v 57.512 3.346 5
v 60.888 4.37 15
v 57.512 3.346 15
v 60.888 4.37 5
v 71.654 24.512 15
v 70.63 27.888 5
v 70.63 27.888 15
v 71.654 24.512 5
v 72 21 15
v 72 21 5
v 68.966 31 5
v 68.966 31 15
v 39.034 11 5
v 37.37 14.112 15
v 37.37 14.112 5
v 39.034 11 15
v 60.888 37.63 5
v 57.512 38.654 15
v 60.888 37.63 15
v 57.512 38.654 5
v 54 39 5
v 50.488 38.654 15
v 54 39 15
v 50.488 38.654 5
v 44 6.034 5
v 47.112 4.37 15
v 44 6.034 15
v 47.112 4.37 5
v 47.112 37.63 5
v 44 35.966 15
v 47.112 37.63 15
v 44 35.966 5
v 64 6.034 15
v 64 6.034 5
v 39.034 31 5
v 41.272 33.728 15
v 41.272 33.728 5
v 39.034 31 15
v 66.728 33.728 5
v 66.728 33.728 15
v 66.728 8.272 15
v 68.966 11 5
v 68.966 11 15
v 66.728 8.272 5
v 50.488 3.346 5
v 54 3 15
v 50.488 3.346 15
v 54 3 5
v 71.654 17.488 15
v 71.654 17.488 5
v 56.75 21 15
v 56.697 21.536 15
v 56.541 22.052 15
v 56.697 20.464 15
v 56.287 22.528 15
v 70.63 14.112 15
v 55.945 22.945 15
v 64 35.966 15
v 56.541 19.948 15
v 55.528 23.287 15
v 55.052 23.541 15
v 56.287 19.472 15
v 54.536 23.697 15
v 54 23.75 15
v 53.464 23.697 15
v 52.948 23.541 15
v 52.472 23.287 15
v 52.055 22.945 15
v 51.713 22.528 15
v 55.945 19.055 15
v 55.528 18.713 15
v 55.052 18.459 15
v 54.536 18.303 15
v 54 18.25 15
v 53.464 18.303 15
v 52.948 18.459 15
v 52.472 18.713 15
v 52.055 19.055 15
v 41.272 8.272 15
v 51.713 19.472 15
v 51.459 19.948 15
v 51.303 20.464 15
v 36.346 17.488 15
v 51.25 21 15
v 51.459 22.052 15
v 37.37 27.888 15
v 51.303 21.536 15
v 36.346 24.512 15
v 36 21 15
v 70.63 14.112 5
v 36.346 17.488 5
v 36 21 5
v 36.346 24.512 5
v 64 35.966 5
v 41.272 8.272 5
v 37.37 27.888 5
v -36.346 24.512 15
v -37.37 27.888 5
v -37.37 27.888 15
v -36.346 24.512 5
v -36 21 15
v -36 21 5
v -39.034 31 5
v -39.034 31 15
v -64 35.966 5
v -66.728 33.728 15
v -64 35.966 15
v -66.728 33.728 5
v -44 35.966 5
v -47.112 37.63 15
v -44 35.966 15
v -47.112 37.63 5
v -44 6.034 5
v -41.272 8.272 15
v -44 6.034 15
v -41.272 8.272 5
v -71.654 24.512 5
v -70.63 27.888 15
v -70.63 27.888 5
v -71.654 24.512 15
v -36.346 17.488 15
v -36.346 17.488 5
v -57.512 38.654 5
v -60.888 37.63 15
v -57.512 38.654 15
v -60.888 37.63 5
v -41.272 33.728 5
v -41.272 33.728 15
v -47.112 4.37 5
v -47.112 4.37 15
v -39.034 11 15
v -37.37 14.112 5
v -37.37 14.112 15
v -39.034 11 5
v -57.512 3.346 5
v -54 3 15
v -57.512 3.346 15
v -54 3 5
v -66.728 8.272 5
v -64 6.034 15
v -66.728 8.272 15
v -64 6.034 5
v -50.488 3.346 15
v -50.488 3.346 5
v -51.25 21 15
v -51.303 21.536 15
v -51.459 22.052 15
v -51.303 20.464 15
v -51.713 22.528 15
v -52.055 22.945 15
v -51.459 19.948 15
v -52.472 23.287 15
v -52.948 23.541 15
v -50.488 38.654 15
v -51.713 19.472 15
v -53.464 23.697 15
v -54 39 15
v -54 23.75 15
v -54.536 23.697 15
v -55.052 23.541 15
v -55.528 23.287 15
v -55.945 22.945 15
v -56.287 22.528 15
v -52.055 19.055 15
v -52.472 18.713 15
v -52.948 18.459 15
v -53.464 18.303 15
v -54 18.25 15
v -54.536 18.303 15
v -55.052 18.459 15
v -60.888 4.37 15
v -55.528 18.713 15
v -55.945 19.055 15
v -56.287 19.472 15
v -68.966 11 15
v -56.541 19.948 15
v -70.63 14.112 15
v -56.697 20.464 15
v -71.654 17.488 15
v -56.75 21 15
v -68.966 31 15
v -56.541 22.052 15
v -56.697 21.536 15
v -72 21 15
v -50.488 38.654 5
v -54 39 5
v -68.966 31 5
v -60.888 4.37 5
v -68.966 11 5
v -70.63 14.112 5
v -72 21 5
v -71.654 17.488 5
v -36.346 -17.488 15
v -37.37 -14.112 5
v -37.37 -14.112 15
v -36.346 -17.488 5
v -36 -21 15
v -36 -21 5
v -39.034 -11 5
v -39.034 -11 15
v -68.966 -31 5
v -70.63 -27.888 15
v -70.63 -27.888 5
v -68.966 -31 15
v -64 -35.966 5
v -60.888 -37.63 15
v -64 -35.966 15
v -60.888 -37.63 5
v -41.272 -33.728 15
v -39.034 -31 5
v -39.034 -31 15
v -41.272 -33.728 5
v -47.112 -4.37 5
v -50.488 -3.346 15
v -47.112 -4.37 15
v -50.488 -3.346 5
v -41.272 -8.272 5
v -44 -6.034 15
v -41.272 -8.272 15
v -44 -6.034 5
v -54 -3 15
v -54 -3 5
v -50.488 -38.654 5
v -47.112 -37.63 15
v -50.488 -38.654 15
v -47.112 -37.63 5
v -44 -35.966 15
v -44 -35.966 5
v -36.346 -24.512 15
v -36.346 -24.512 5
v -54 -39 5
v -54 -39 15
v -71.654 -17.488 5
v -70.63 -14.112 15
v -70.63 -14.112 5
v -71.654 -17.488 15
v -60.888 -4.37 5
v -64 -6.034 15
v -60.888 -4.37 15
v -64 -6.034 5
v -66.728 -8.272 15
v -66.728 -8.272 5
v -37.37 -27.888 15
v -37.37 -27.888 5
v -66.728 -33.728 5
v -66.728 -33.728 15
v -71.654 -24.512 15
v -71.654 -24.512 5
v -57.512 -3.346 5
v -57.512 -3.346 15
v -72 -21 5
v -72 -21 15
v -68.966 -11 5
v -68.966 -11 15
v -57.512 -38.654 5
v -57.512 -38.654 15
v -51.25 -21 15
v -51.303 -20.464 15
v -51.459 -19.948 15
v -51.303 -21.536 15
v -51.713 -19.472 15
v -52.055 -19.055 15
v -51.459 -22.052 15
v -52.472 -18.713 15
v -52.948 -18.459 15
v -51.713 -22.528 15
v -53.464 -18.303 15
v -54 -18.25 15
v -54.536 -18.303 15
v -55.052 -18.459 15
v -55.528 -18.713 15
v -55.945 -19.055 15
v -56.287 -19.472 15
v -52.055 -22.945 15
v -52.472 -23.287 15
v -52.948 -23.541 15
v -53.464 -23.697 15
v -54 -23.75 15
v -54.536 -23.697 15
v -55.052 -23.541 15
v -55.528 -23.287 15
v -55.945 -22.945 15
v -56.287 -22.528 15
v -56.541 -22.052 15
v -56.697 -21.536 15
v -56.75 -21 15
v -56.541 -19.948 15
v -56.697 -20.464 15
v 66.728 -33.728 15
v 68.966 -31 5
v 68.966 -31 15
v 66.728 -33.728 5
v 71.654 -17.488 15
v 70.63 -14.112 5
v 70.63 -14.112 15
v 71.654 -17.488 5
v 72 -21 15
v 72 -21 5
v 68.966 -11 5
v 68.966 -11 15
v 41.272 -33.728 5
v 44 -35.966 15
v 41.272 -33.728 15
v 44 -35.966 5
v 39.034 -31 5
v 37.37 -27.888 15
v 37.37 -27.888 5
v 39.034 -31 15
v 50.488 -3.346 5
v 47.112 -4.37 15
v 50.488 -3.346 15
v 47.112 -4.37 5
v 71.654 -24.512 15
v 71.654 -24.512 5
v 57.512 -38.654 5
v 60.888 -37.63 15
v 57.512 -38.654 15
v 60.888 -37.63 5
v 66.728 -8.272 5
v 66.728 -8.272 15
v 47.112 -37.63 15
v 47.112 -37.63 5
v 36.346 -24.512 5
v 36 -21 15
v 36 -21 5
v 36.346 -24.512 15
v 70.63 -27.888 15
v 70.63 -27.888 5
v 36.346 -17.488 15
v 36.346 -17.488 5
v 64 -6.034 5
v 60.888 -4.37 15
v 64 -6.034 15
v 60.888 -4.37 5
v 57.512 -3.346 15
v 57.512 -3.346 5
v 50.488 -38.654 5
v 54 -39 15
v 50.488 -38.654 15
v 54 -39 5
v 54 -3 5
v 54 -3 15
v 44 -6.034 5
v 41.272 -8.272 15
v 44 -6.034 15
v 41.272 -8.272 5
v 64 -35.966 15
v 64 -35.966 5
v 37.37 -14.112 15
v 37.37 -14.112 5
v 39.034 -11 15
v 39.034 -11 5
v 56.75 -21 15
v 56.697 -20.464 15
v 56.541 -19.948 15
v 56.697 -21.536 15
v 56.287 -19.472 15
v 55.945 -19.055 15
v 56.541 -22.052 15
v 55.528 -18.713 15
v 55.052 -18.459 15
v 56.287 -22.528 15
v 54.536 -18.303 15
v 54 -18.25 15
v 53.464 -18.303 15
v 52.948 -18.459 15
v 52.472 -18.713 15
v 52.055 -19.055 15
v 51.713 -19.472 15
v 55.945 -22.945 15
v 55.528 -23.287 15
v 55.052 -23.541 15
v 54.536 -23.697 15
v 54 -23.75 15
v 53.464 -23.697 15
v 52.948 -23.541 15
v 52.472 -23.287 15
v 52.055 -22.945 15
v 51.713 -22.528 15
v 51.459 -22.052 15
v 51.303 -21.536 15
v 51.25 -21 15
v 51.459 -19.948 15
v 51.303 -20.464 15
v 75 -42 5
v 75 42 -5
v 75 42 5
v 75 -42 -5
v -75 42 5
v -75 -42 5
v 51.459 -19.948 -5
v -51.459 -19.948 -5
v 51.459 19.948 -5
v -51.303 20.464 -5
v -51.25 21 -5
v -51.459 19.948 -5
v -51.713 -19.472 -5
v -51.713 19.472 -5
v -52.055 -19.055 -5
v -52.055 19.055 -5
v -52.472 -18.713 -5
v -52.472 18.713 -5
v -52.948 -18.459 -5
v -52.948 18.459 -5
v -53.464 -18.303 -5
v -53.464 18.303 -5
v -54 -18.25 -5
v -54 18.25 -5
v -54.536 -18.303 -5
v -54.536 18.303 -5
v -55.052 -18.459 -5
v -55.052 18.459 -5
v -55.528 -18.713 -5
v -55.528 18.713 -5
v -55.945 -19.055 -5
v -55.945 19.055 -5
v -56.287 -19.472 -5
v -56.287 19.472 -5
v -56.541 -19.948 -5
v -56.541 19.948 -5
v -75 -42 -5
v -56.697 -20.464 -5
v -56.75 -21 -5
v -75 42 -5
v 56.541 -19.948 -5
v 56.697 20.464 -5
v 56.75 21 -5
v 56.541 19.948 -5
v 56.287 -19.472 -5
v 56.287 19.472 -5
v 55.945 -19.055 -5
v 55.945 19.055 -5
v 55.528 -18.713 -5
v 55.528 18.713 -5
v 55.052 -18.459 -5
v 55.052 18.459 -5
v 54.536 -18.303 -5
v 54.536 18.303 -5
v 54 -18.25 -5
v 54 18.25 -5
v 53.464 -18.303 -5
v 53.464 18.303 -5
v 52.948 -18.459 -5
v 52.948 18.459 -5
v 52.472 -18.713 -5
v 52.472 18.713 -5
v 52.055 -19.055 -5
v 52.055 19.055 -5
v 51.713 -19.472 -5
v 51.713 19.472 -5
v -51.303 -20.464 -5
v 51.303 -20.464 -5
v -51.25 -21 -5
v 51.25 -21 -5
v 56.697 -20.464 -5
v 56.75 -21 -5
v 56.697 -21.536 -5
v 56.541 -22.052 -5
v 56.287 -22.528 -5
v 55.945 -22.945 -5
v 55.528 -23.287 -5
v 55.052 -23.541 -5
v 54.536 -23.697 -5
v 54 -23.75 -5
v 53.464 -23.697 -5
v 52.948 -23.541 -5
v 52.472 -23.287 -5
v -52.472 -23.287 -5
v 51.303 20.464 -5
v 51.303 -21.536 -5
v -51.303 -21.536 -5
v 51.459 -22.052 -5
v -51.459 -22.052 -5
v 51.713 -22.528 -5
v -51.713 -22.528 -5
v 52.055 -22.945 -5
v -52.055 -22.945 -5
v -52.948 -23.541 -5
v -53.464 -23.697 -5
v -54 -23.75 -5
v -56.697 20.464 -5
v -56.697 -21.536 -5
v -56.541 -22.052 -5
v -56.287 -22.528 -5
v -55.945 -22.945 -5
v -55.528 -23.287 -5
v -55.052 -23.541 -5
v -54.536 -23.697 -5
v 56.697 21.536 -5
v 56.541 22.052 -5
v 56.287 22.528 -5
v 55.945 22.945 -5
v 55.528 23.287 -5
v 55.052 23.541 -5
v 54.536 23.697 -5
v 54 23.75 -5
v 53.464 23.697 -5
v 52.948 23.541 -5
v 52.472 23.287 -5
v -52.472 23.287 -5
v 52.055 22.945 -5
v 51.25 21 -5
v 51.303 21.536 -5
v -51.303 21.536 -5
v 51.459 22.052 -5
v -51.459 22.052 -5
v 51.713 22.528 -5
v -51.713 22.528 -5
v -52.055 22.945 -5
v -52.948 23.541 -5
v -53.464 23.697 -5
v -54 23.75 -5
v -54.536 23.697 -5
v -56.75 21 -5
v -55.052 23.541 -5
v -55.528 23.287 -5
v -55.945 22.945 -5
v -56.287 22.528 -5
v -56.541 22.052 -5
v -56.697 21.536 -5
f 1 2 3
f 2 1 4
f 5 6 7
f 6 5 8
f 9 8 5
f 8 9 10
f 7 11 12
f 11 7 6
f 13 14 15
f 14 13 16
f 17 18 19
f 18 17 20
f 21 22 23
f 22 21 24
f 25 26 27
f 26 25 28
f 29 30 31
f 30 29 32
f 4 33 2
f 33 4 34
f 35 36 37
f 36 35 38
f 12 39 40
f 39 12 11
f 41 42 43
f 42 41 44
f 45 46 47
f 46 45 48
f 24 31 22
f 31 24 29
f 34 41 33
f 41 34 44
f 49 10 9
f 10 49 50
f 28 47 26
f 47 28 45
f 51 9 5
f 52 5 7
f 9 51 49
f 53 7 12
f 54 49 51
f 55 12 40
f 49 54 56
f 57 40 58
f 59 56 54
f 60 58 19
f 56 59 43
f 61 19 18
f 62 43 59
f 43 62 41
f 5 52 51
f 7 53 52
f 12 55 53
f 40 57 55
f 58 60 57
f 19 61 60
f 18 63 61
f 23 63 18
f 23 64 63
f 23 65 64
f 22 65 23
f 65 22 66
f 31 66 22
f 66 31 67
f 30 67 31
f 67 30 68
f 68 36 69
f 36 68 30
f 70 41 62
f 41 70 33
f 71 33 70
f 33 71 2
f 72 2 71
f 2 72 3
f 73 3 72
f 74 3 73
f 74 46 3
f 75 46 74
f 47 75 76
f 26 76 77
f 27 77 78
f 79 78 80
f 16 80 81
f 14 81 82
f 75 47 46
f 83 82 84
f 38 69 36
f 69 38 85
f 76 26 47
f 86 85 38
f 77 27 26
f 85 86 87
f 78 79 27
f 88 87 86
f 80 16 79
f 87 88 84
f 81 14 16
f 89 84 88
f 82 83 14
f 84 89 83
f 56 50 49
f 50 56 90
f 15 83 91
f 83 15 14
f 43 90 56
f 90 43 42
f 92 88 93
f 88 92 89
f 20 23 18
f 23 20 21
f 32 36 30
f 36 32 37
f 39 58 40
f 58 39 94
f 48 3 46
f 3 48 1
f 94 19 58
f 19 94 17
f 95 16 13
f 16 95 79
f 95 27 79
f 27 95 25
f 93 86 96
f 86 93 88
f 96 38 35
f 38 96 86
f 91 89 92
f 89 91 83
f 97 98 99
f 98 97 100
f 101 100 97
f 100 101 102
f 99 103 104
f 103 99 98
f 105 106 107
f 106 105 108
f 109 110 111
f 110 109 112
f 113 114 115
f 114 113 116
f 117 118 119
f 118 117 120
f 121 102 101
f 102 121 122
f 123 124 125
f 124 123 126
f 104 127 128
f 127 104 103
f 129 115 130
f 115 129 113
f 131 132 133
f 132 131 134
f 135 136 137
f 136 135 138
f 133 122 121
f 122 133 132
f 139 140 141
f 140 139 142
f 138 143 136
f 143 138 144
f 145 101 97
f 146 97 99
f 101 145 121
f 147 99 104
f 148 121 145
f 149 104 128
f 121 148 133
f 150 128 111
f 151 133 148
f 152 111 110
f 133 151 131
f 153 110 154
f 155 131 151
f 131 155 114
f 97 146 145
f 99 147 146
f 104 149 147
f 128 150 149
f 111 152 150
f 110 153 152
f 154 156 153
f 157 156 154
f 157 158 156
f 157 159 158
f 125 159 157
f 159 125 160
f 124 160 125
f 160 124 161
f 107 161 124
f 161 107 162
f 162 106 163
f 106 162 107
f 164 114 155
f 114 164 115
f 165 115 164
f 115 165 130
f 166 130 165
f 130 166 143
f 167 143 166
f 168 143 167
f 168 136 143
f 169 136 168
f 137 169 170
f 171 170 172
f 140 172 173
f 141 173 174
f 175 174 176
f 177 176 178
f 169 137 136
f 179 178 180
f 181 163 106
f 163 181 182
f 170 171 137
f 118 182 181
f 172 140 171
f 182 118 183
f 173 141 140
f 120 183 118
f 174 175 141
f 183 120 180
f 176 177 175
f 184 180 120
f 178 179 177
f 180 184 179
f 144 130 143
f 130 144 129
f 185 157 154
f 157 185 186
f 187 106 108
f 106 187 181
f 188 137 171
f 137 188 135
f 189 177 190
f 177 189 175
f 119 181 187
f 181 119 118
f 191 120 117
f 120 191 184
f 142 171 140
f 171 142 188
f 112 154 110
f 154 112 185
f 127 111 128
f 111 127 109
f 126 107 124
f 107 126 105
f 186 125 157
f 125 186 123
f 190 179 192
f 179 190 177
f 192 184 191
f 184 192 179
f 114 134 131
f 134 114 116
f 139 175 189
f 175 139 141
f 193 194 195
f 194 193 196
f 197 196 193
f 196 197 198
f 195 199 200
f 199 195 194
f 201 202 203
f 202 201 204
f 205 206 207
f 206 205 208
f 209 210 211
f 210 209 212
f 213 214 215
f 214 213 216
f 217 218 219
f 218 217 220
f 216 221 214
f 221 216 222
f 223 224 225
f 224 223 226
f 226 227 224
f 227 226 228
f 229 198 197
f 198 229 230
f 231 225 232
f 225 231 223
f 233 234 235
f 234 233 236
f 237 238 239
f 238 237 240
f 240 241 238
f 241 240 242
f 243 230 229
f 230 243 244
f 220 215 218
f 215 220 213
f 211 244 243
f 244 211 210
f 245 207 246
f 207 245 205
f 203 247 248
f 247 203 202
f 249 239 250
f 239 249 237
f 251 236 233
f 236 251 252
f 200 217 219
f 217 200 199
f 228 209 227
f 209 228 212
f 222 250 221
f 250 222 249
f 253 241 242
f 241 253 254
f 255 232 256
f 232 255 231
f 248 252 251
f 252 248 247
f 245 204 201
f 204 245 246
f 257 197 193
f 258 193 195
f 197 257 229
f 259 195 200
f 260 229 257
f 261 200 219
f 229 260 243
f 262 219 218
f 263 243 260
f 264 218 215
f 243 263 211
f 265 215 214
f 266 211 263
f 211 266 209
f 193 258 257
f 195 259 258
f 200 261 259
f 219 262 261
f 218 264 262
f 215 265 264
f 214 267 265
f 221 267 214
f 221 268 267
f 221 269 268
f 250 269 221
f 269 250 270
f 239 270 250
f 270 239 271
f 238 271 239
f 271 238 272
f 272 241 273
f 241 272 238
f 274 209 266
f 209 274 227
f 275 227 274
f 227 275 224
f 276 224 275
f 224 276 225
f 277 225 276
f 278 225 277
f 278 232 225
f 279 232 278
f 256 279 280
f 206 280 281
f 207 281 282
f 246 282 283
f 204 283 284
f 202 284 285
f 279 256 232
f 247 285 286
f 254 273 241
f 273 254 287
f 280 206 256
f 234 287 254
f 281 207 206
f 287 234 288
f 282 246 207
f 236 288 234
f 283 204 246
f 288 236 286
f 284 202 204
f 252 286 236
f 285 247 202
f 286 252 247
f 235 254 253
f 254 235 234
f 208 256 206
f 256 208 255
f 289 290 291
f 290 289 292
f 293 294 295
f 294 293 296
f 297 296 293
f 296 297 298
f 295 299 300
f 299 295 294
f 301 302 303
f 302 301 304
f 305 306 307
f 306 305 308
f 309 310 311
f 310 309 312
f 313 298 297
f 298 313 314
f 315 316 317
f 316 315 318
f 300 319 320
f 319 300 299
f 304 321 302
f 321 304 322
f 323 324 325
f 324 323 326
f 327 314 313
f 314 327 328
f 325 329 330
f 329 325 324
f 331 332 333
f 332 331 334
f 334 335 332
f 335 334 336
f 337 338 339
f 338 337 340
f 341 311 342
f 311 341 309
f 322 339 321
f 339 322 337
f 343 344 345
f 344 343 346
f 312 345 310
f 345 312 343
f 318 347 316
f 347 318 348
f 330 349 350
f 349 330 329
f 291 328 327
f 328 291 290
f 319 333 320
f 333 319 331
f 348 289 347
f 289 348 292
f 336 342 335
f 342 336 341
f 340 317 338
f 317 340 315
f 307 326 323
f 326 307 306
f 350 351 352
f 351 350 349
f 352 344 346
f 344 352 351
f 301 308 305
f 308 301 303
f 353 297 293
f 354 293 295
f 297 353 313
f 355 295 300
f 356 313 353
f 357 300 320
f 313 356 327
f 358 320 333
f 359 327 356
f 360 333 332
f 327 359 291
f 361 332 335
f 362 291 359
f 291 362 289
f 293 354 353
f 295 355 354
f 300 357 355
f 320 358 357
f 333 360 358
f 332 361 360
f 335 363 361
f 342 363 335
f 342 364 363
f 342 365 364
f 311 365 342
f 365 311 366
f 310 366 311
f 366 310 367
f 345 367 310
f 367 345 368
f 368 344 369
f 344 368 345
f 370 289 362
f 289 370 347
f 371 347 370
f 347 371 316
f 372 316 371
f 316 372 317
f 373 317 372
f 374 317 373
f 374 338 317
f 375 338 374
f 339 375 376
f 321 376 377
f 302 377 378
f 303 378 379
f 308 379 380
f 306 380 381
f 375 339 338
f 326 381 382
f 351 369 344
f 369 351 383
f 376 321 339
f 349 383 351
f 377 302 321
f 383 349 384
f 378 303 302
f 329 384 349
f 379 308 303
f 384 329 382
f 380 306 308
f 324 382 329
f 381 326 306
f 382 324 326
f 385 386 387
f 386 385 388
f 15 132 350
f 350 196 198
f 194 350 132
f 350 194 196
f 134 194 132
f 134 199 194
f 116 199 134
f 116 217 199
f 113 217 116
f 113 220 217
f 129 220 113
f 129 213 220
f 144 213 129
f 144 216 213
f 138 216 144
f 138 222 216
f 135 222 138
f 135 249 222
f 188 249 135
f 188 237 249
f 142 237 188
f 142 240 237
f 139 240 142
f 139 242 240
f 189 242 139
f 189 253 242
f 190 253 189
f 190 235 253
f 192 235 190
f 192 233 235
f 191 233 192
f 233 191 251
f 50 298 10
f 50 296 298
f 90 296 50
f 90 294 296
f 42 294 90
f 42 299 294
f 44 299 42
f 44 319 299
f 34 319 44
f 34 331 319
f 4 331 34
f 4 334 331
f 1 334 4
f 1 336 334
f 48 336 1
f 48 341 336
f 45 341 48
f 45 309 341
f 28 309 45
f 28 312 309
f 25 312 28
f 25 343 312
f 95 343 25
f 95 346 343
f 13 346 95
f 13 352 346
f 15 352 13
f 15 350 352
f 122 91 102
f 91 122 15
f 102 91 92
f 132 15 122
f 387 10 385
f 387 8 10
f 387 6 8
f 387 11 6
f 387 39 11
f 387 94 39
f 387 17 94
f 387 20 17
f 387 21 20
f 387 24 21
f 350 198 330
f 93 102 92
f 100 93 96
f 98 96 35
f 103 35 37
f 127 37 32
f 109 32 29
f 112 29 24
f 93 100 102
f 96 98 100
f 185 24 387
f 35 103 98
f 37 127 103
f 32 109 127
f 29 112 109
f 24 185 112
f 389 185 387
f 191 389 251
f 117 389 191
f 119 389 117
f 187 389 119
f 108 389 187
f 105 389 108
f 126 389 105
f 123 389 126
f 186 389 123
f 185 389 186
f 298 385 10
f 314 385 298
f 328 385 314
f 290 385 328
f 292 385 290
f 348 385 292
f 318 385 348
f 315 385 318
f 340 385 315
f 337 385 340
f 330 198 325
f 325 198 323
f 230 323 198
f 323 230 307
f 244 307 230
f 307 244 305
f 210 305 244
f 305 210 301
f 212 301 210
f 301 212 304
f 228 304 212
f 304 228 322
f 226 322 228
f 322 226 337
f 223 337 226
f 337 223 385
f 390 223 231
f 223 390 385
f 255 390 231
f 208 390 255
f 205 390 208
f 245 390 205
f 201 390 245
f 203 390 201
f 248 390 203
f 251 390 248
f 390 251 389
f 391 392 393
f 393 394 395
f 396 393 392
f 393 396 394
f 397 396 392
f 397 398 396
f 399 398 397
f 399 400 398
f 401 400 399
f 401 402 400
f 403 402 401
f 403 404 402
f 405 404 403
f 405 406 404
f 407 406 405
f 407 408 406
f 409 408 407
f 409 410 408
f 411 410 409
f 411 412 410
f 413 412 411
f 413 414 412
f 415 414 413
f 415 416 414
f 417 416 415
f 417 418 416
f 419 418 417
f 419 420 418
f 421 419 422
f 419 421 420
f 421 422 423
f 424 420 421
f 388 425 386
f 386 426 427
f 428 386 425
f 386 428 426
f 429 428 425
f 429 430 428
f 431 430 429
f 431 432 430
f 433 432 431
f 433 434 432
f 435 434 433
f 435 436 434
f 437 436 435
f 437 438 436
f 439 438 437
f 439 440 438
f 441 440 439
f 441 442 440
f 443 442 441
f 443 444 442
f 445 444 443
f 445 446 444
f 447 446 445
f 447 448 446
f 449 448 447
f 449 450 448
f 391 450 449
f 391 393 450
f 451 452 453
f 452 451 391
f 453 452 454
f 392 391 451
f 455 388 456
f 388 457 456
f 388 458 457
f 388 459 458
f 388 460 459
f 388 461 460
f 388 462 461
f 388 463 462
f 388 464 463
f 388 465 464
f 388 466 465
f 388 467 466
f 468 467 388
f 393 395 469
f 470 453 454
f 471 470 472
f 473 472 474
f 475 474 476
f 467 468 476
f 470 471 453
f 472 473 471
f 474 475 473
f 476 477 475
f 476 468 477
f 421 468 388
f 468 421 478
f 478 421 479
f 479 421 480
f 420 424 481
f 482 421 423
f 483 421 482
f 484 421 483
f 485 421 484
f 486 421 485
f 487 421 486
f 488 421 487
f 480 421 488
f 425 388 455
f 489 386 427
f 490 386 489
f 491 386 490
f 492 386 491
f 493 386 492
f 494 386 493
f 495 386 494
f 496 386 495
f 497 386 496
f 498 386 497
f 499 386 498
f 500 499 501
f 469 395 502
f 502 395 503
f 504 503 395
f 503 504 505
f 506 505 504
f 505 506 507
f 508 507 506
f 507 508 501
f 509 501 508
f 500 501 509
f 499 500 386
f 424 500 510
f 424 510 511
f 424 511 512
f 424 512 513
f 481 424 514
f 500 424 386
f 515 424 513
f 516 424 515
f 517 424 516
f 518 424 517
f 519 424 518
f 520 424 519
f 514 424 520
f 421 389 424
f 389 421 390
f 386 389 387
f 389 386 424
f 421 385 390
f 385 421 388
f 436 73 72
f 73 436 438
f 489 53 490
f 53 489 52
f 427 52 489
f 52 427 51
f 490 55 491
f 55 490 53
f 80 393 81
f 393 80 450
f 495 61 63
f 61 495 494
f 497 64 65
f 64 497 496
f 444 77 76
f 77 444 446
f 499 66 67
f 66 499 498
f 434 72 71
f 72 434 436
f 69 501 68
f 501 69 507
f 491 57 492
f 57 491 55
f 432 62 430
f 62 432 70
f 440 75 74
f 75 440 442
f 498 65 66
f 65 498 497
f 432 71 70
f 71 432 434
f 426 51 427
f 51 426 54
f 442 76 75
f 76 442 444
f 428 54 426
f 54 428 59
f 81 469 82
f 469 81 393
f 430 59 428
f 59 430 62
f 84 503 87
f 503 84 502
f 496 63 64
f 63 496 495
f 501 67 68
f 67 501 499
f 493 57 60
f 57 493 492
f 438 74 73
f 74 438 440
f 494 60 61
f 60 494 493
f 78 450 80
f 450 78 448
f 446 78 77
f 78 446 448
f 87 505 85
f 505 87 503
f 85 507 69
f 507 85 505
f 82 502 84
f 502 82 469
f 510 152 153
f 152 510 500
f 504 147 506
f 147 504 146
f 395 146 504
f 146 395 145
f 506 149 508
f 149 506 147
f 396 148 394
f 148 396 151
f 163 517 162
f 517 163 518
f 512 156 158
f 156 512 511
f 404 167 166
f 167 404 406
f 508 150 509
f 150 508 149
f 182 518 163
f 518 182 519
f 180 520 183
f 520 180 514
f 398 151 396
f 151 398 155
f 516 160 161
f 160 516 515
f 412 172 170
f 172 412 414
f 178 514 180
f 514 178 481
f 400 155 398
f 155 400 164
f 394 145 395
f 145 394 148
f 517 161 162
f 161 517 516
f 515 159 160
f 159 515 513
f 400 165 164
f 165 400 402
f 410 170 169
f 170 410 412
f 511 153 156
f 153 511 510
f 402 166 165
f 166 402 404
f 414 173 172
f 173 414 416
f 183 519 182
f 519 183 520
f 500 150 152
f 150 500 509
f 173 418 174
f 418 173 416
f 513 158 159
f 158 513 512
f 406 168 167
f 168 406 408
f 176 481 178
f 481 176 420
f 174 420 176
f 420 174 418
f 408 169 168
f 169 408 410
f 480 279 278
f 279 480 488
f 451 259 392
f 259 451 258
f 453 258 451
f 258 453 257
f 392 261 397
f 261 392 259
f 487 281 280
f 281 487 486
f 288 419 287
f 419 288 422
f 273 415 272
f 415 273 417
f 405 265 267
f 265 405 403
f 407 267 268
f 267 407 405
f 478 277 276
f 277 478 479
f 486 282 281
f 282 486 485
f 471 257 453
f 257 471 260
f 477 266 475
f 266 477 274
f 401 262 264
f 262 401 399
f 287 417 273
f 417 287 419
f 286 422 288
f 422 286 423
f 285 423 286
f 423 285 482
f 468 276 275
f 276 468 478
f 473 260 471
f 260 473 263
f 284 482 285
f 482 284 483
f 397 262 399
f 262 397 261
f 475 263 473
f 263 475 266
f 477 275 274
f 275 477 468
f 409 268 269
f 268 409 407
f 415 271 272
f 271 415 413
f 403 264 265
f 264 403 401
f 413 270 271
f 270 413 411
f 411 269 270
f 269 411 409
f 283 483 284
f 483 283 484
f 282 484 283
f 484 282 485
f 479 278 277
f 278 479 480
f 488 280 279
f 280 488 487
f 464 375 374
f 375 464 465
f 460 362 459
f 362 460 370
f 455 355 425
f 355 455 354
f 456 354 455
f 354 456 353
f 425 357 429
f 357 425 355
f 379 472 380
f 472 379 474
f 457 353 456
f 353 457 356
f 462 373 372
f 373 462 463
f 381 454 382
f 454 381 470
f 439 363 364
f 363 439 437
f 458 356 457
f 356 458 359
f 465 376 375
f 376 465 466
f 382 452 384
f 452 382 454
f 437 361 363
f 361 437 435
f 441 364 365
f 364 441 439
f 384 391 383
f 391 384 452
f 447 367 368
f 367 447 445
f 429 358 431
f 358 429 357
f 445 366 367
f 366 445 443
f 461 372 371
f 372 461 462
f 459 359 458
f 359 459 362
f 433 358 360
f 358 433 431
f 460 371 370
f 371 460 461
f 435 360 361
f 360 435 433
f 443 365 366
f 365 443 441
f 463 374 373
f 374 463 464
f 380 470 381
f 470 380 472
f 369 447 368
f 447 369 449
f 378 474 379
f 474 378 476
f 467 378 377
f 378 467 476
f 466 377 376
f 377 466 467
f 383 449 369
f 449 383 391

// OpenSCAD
$fn = 32;

// ----------------------------------------------------------------------
// Anchor pads 150 x 84 x 20
// four corner bosses with anchor holes
// ----------------------------------------------------------------------

// --- parameters (mm) ---
plate = [150, 84, 10];  // base plate size (x, y, z)
pads = 4;               // boss count, one per corner
edge = 21;              // boss centre offset from the plate edge
boss_d = 36;            // boss diameter
boss_h = 10;            // boss height above the base plate
hole_d = 5.5;           // hole diameter

// --- derived feature positions (mm) ---
height = plate[2] + boss_h;      // = 20   overall height of the part
corner_x = plate[0] / 2 - edge;  // = 54   boss centre X
corner_y = plate[1] / 2 - edge;  // = 21   boss centre Y
feature_centers = [
  [corner_x, corner_y],
  [-corner_x, corner_y],
  [-corner_x, -corner_y],
  [corner_x, -corner_y]
];   // boss centres, anchor holes are drilled there

// base plate, four bosses standing on it, anchor holes all the way through
difference() {
  union() {
    cube(plate, center = true);
    for (centre = feature_centers)
      translate([centre[0], centre[1], plate[2] / 2 - 1])
        cylinder(d = boss_d, h = boss_h + 1);
  }
  for (centre = feature_centers)
    translate([centre[0], centre[1], -height])
      cylinder(d = hole_d, h = 2 * height + 2);  // through boss and plate
}
